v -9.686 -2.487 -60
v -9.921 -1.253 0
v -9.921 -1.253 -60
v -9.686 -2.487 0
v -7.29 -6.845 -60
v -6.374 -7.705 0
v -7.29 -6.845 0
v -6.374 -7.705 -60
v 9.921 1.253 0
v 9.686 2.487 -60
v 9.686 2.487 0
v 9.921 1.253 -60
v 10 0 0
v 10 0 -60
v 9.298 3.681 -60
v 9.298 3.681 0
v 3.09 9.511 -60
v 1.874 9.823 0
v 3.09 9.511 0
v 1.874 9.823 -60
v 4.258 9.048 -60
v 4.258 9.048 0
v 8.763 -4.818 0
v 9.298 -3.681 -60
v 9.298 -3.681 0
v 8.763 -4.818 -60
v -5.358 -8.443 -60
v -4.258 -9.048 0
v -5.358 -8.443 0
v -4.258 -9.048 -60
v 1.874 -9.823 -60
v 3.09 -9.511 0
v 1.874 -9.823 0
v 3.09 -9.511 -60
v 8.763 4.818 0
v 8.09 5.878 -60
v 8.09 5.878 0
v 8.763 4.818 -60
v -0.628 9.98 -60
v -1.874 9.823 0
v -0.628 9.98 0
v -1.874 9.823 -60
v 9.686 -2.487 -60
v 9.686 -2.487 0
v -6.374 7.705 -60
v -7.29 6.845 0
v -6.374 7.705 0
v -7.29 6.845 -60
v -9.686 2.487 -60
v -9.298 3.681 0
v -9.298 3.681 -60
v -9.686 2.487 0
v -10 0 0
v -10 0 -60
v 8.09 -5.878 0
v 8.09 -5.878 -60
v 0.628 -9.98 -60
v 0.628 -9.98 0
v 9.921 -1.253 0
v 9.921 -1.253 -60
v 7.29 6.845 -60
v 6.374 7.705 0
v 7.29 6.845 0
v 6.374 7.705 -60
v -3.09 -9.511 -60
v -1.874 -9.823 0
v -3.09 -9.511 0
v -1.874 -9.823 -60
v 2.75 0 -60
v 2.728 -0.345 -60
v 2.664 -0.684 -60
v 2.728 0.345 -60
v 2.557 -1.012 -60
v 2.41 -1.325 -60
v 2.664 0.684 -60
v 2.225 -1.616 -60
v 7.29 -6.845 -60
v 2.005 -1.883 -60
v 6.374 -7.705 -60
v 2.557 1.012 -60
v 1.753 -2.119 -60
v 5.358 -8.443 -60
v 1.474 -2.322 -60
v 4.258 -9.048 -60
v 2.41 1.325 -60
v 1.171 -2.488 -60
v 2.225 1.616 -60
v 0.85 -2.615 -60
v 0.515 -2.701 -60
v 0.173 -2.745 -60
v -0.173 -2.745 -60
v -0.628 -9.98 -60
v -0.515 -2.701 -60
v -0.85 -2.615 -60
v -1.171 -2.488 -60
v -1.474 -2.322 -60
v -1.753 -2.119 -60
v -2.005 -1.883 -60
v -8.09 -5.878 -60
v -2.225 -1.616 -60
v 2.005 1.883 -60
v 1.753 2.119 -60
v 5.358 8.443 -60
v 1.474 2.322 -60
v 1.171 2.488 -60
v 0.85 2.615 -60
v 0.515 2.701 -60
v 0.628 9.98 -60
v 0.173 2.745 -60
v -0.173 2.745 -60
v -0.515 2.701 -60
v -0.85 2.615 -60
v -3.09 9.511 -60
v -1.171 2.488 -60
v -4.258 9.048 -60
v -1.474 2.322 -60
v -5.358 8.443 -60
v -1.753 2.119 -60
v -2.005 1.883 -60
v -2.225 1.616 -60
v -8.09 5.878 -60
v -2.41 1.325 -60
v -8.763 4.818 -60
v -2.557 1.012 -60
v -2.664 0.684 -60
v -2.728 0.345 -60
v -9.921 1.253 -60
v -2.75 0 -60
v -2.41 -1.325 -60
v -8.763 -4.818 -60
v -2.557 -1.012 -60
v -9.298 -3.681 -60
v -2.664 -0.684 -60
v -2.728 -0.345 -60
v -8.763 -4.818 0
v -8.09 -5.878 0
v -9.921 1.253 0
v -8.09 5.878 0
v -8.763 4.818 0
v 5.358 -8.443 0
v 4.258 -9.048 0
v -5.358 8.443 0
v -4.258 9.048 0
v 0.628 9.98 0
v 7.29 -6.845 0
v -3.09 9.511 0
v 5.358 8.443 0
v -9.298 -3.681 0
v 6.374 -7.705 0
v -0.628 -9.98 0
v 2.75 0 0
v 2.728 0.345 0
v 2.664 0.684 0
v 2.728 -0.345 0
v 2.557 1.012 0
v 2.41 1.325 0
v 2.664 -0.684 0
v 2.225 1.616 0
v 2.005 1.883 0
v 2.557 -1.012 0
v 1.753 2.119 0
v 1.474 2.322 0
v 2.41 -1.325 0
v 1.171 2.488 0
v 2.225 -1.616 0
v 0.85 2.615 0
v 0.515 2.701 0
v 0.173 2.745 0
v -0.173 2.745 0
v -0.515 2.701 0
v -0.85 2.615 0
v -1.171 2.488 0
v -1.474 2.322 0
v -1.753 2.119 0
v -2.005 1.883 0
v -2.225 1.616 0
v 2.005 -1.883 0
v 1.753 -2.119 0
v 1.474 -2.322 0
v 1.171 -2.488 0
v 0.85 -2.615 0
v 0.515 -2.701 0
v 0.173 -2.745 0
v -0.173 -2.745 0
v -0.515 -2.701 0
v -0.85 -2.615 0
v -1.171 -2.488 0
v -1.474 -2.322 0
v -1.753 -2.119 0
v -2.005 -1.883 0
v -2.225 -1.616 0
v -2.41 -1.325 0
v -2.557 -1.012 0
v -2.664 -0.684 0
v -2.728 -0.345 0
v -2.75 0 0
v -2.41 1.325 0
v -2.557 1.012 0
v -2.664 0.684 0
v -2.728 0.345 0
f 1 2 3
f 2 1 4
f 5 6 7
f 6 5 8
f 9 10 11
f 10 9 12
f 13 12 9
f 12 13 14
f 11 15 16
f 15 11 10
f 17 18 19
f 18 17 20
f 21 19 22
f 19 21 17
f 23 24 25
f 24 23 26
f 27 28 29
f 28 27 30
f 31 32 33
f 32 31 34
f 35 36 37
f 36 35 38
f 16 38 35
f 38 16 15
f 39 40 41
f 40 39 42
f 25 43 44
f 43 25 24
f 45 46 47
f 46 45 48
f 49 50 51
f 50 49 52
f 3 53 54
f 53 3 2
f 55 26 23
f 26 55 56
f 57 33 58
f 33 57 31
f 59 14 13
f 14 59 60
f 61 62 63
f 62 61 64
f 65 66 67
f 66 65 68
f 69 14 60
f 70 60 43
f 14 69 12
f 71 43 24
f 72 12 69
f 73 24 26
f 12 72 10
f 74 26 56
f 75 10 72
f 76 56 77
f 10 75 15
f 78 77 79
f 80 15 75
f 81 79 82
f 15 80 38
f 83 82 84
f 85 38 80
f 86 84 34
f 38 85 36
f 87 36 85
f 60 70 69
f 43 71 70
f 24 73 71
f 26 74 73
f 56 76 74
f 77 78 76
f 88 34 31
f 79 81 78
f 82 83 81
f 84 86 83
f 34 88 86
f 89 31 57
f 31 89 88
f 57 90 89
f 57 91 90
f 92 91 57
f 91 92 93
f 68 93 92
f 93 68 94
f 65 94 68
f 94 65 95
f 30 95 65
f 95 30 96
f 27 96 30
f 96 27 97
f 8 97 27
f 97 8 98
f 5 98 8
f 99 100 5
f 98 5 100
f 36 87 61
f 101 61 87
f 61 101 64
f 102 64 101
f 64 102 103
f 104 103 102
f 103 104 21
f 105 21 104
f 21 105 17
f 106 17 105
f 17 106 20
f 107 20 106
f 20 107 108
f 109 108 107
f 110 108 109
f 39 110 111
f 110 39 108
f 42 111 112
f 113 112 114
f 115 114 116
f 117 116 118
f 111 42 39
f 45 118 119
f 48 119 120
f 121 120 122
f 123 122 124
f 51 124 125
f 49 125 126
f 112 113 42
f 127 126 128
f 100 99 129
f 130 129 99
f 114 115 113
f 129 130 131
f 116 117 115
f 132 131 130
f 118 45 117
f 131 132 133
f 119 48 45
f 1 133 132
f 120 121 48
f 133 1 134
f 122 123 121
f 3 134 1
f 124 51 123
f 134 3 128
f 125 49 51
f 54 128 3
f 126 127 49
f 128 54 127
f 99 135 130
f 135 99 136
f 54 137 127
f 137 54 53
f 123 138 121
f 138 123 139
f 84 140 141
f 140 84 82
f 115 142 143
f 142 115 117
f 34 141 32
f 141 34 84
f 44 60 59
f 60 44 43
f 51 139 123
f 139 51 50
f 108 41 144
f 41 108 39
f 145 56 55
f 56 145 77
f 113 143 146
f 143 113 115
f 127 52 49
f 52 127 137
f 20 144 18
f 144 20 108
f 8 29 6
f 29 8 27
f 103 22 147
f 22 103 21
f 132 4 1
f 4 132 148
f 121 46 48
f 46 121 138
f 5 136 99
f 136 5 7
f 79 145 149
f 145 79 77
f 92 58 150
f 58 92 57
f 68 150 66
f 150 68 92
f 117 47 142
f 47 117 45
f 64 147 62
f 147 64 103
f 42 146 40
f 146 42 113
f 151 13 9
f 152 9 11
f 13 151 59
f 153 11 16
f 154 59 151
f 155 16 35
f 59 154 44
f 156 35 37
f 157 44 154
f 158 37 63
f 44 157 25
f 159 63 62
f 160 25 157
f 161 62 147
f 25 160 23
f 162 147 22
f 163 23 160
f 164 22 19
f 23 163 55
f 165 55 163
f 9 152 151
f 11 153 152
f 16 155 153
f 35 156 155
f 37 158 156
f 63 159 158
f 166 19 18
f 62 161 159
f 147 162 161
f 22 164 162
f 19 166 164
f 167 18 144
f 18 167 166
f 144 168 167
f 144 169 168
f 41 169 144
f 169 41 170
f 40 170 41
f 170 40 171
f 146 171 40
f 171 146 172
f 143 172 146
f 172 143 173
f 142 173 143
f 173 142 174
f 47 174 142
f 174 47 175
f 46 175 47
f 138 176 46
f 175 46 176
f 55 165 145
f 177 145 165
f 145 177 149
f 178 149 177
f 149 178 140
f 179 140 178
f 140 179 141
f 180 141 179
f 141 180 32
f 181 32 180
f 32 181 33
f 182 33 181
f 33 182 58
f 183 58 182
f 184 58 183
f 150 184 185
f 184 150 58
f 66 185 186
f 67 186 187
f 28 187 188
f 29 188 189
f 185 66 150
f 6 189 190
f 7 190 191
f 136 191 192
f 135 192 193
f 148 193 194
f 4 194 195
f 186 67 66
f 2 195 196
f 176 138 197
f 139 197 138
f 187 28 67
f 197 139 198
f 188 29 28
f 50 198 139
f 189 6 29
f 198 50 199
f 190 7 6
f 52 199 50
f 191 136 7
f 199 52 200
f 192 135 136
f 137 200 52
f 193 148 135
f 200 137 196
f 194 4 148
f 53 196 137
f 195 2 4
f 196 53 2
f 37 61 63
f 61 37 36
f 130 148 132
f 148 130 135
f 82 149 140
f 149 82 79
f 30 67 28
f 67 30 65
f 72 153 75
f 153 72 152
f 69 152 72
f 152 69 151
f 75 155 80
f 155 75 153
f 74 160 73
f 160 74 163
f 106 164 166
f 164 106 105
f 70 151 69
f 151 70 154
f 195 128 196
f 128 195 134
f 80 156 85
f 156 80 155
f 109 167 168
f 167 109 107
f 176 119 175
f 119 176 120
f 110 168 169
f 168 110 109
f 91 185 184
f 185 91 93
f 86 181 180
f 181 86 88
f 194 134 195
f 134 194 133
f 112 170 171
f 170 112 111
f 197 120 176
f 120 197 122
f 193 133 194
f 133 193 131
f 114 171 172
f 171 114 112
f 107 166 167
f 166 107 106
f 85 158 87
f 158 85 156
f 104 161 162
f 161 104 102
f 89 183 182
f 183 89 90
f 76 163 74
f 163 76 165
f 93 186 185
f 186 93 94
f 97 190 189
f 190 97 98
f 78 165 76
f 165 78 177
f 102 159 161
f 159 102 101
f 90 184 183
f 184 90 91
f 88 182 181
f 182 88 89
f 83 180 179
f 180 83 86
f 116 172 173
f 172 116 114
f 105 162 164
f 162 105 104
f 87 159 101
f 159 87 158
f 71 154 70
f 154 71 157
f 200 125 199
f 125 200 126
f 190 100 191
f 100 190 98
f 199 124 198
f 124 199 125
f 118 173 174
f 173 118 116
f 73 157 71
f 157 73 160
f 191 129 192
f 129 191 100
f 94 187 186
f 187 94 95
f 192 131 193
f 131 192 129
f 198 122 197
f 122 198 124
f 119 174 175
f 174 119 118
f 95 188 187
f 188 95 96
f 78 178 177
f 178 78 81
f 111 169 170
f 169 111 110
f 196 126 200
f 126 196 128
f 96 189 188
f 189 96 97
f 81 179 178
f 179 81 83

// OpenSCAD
$fn = 50;


difference() {
	union() {
		translate(v = [0, 0, -60.0000000000]) {
			cylinder(h = 60, r = 10.0000000000);
		}
		cylinder(h = 0, r = 20.0000000000);
	}
	union() {
		#translate(v = [0, 0, -60]) {
			cylinder(h = 60, r = 2.7500000000);
		}
	}
}
